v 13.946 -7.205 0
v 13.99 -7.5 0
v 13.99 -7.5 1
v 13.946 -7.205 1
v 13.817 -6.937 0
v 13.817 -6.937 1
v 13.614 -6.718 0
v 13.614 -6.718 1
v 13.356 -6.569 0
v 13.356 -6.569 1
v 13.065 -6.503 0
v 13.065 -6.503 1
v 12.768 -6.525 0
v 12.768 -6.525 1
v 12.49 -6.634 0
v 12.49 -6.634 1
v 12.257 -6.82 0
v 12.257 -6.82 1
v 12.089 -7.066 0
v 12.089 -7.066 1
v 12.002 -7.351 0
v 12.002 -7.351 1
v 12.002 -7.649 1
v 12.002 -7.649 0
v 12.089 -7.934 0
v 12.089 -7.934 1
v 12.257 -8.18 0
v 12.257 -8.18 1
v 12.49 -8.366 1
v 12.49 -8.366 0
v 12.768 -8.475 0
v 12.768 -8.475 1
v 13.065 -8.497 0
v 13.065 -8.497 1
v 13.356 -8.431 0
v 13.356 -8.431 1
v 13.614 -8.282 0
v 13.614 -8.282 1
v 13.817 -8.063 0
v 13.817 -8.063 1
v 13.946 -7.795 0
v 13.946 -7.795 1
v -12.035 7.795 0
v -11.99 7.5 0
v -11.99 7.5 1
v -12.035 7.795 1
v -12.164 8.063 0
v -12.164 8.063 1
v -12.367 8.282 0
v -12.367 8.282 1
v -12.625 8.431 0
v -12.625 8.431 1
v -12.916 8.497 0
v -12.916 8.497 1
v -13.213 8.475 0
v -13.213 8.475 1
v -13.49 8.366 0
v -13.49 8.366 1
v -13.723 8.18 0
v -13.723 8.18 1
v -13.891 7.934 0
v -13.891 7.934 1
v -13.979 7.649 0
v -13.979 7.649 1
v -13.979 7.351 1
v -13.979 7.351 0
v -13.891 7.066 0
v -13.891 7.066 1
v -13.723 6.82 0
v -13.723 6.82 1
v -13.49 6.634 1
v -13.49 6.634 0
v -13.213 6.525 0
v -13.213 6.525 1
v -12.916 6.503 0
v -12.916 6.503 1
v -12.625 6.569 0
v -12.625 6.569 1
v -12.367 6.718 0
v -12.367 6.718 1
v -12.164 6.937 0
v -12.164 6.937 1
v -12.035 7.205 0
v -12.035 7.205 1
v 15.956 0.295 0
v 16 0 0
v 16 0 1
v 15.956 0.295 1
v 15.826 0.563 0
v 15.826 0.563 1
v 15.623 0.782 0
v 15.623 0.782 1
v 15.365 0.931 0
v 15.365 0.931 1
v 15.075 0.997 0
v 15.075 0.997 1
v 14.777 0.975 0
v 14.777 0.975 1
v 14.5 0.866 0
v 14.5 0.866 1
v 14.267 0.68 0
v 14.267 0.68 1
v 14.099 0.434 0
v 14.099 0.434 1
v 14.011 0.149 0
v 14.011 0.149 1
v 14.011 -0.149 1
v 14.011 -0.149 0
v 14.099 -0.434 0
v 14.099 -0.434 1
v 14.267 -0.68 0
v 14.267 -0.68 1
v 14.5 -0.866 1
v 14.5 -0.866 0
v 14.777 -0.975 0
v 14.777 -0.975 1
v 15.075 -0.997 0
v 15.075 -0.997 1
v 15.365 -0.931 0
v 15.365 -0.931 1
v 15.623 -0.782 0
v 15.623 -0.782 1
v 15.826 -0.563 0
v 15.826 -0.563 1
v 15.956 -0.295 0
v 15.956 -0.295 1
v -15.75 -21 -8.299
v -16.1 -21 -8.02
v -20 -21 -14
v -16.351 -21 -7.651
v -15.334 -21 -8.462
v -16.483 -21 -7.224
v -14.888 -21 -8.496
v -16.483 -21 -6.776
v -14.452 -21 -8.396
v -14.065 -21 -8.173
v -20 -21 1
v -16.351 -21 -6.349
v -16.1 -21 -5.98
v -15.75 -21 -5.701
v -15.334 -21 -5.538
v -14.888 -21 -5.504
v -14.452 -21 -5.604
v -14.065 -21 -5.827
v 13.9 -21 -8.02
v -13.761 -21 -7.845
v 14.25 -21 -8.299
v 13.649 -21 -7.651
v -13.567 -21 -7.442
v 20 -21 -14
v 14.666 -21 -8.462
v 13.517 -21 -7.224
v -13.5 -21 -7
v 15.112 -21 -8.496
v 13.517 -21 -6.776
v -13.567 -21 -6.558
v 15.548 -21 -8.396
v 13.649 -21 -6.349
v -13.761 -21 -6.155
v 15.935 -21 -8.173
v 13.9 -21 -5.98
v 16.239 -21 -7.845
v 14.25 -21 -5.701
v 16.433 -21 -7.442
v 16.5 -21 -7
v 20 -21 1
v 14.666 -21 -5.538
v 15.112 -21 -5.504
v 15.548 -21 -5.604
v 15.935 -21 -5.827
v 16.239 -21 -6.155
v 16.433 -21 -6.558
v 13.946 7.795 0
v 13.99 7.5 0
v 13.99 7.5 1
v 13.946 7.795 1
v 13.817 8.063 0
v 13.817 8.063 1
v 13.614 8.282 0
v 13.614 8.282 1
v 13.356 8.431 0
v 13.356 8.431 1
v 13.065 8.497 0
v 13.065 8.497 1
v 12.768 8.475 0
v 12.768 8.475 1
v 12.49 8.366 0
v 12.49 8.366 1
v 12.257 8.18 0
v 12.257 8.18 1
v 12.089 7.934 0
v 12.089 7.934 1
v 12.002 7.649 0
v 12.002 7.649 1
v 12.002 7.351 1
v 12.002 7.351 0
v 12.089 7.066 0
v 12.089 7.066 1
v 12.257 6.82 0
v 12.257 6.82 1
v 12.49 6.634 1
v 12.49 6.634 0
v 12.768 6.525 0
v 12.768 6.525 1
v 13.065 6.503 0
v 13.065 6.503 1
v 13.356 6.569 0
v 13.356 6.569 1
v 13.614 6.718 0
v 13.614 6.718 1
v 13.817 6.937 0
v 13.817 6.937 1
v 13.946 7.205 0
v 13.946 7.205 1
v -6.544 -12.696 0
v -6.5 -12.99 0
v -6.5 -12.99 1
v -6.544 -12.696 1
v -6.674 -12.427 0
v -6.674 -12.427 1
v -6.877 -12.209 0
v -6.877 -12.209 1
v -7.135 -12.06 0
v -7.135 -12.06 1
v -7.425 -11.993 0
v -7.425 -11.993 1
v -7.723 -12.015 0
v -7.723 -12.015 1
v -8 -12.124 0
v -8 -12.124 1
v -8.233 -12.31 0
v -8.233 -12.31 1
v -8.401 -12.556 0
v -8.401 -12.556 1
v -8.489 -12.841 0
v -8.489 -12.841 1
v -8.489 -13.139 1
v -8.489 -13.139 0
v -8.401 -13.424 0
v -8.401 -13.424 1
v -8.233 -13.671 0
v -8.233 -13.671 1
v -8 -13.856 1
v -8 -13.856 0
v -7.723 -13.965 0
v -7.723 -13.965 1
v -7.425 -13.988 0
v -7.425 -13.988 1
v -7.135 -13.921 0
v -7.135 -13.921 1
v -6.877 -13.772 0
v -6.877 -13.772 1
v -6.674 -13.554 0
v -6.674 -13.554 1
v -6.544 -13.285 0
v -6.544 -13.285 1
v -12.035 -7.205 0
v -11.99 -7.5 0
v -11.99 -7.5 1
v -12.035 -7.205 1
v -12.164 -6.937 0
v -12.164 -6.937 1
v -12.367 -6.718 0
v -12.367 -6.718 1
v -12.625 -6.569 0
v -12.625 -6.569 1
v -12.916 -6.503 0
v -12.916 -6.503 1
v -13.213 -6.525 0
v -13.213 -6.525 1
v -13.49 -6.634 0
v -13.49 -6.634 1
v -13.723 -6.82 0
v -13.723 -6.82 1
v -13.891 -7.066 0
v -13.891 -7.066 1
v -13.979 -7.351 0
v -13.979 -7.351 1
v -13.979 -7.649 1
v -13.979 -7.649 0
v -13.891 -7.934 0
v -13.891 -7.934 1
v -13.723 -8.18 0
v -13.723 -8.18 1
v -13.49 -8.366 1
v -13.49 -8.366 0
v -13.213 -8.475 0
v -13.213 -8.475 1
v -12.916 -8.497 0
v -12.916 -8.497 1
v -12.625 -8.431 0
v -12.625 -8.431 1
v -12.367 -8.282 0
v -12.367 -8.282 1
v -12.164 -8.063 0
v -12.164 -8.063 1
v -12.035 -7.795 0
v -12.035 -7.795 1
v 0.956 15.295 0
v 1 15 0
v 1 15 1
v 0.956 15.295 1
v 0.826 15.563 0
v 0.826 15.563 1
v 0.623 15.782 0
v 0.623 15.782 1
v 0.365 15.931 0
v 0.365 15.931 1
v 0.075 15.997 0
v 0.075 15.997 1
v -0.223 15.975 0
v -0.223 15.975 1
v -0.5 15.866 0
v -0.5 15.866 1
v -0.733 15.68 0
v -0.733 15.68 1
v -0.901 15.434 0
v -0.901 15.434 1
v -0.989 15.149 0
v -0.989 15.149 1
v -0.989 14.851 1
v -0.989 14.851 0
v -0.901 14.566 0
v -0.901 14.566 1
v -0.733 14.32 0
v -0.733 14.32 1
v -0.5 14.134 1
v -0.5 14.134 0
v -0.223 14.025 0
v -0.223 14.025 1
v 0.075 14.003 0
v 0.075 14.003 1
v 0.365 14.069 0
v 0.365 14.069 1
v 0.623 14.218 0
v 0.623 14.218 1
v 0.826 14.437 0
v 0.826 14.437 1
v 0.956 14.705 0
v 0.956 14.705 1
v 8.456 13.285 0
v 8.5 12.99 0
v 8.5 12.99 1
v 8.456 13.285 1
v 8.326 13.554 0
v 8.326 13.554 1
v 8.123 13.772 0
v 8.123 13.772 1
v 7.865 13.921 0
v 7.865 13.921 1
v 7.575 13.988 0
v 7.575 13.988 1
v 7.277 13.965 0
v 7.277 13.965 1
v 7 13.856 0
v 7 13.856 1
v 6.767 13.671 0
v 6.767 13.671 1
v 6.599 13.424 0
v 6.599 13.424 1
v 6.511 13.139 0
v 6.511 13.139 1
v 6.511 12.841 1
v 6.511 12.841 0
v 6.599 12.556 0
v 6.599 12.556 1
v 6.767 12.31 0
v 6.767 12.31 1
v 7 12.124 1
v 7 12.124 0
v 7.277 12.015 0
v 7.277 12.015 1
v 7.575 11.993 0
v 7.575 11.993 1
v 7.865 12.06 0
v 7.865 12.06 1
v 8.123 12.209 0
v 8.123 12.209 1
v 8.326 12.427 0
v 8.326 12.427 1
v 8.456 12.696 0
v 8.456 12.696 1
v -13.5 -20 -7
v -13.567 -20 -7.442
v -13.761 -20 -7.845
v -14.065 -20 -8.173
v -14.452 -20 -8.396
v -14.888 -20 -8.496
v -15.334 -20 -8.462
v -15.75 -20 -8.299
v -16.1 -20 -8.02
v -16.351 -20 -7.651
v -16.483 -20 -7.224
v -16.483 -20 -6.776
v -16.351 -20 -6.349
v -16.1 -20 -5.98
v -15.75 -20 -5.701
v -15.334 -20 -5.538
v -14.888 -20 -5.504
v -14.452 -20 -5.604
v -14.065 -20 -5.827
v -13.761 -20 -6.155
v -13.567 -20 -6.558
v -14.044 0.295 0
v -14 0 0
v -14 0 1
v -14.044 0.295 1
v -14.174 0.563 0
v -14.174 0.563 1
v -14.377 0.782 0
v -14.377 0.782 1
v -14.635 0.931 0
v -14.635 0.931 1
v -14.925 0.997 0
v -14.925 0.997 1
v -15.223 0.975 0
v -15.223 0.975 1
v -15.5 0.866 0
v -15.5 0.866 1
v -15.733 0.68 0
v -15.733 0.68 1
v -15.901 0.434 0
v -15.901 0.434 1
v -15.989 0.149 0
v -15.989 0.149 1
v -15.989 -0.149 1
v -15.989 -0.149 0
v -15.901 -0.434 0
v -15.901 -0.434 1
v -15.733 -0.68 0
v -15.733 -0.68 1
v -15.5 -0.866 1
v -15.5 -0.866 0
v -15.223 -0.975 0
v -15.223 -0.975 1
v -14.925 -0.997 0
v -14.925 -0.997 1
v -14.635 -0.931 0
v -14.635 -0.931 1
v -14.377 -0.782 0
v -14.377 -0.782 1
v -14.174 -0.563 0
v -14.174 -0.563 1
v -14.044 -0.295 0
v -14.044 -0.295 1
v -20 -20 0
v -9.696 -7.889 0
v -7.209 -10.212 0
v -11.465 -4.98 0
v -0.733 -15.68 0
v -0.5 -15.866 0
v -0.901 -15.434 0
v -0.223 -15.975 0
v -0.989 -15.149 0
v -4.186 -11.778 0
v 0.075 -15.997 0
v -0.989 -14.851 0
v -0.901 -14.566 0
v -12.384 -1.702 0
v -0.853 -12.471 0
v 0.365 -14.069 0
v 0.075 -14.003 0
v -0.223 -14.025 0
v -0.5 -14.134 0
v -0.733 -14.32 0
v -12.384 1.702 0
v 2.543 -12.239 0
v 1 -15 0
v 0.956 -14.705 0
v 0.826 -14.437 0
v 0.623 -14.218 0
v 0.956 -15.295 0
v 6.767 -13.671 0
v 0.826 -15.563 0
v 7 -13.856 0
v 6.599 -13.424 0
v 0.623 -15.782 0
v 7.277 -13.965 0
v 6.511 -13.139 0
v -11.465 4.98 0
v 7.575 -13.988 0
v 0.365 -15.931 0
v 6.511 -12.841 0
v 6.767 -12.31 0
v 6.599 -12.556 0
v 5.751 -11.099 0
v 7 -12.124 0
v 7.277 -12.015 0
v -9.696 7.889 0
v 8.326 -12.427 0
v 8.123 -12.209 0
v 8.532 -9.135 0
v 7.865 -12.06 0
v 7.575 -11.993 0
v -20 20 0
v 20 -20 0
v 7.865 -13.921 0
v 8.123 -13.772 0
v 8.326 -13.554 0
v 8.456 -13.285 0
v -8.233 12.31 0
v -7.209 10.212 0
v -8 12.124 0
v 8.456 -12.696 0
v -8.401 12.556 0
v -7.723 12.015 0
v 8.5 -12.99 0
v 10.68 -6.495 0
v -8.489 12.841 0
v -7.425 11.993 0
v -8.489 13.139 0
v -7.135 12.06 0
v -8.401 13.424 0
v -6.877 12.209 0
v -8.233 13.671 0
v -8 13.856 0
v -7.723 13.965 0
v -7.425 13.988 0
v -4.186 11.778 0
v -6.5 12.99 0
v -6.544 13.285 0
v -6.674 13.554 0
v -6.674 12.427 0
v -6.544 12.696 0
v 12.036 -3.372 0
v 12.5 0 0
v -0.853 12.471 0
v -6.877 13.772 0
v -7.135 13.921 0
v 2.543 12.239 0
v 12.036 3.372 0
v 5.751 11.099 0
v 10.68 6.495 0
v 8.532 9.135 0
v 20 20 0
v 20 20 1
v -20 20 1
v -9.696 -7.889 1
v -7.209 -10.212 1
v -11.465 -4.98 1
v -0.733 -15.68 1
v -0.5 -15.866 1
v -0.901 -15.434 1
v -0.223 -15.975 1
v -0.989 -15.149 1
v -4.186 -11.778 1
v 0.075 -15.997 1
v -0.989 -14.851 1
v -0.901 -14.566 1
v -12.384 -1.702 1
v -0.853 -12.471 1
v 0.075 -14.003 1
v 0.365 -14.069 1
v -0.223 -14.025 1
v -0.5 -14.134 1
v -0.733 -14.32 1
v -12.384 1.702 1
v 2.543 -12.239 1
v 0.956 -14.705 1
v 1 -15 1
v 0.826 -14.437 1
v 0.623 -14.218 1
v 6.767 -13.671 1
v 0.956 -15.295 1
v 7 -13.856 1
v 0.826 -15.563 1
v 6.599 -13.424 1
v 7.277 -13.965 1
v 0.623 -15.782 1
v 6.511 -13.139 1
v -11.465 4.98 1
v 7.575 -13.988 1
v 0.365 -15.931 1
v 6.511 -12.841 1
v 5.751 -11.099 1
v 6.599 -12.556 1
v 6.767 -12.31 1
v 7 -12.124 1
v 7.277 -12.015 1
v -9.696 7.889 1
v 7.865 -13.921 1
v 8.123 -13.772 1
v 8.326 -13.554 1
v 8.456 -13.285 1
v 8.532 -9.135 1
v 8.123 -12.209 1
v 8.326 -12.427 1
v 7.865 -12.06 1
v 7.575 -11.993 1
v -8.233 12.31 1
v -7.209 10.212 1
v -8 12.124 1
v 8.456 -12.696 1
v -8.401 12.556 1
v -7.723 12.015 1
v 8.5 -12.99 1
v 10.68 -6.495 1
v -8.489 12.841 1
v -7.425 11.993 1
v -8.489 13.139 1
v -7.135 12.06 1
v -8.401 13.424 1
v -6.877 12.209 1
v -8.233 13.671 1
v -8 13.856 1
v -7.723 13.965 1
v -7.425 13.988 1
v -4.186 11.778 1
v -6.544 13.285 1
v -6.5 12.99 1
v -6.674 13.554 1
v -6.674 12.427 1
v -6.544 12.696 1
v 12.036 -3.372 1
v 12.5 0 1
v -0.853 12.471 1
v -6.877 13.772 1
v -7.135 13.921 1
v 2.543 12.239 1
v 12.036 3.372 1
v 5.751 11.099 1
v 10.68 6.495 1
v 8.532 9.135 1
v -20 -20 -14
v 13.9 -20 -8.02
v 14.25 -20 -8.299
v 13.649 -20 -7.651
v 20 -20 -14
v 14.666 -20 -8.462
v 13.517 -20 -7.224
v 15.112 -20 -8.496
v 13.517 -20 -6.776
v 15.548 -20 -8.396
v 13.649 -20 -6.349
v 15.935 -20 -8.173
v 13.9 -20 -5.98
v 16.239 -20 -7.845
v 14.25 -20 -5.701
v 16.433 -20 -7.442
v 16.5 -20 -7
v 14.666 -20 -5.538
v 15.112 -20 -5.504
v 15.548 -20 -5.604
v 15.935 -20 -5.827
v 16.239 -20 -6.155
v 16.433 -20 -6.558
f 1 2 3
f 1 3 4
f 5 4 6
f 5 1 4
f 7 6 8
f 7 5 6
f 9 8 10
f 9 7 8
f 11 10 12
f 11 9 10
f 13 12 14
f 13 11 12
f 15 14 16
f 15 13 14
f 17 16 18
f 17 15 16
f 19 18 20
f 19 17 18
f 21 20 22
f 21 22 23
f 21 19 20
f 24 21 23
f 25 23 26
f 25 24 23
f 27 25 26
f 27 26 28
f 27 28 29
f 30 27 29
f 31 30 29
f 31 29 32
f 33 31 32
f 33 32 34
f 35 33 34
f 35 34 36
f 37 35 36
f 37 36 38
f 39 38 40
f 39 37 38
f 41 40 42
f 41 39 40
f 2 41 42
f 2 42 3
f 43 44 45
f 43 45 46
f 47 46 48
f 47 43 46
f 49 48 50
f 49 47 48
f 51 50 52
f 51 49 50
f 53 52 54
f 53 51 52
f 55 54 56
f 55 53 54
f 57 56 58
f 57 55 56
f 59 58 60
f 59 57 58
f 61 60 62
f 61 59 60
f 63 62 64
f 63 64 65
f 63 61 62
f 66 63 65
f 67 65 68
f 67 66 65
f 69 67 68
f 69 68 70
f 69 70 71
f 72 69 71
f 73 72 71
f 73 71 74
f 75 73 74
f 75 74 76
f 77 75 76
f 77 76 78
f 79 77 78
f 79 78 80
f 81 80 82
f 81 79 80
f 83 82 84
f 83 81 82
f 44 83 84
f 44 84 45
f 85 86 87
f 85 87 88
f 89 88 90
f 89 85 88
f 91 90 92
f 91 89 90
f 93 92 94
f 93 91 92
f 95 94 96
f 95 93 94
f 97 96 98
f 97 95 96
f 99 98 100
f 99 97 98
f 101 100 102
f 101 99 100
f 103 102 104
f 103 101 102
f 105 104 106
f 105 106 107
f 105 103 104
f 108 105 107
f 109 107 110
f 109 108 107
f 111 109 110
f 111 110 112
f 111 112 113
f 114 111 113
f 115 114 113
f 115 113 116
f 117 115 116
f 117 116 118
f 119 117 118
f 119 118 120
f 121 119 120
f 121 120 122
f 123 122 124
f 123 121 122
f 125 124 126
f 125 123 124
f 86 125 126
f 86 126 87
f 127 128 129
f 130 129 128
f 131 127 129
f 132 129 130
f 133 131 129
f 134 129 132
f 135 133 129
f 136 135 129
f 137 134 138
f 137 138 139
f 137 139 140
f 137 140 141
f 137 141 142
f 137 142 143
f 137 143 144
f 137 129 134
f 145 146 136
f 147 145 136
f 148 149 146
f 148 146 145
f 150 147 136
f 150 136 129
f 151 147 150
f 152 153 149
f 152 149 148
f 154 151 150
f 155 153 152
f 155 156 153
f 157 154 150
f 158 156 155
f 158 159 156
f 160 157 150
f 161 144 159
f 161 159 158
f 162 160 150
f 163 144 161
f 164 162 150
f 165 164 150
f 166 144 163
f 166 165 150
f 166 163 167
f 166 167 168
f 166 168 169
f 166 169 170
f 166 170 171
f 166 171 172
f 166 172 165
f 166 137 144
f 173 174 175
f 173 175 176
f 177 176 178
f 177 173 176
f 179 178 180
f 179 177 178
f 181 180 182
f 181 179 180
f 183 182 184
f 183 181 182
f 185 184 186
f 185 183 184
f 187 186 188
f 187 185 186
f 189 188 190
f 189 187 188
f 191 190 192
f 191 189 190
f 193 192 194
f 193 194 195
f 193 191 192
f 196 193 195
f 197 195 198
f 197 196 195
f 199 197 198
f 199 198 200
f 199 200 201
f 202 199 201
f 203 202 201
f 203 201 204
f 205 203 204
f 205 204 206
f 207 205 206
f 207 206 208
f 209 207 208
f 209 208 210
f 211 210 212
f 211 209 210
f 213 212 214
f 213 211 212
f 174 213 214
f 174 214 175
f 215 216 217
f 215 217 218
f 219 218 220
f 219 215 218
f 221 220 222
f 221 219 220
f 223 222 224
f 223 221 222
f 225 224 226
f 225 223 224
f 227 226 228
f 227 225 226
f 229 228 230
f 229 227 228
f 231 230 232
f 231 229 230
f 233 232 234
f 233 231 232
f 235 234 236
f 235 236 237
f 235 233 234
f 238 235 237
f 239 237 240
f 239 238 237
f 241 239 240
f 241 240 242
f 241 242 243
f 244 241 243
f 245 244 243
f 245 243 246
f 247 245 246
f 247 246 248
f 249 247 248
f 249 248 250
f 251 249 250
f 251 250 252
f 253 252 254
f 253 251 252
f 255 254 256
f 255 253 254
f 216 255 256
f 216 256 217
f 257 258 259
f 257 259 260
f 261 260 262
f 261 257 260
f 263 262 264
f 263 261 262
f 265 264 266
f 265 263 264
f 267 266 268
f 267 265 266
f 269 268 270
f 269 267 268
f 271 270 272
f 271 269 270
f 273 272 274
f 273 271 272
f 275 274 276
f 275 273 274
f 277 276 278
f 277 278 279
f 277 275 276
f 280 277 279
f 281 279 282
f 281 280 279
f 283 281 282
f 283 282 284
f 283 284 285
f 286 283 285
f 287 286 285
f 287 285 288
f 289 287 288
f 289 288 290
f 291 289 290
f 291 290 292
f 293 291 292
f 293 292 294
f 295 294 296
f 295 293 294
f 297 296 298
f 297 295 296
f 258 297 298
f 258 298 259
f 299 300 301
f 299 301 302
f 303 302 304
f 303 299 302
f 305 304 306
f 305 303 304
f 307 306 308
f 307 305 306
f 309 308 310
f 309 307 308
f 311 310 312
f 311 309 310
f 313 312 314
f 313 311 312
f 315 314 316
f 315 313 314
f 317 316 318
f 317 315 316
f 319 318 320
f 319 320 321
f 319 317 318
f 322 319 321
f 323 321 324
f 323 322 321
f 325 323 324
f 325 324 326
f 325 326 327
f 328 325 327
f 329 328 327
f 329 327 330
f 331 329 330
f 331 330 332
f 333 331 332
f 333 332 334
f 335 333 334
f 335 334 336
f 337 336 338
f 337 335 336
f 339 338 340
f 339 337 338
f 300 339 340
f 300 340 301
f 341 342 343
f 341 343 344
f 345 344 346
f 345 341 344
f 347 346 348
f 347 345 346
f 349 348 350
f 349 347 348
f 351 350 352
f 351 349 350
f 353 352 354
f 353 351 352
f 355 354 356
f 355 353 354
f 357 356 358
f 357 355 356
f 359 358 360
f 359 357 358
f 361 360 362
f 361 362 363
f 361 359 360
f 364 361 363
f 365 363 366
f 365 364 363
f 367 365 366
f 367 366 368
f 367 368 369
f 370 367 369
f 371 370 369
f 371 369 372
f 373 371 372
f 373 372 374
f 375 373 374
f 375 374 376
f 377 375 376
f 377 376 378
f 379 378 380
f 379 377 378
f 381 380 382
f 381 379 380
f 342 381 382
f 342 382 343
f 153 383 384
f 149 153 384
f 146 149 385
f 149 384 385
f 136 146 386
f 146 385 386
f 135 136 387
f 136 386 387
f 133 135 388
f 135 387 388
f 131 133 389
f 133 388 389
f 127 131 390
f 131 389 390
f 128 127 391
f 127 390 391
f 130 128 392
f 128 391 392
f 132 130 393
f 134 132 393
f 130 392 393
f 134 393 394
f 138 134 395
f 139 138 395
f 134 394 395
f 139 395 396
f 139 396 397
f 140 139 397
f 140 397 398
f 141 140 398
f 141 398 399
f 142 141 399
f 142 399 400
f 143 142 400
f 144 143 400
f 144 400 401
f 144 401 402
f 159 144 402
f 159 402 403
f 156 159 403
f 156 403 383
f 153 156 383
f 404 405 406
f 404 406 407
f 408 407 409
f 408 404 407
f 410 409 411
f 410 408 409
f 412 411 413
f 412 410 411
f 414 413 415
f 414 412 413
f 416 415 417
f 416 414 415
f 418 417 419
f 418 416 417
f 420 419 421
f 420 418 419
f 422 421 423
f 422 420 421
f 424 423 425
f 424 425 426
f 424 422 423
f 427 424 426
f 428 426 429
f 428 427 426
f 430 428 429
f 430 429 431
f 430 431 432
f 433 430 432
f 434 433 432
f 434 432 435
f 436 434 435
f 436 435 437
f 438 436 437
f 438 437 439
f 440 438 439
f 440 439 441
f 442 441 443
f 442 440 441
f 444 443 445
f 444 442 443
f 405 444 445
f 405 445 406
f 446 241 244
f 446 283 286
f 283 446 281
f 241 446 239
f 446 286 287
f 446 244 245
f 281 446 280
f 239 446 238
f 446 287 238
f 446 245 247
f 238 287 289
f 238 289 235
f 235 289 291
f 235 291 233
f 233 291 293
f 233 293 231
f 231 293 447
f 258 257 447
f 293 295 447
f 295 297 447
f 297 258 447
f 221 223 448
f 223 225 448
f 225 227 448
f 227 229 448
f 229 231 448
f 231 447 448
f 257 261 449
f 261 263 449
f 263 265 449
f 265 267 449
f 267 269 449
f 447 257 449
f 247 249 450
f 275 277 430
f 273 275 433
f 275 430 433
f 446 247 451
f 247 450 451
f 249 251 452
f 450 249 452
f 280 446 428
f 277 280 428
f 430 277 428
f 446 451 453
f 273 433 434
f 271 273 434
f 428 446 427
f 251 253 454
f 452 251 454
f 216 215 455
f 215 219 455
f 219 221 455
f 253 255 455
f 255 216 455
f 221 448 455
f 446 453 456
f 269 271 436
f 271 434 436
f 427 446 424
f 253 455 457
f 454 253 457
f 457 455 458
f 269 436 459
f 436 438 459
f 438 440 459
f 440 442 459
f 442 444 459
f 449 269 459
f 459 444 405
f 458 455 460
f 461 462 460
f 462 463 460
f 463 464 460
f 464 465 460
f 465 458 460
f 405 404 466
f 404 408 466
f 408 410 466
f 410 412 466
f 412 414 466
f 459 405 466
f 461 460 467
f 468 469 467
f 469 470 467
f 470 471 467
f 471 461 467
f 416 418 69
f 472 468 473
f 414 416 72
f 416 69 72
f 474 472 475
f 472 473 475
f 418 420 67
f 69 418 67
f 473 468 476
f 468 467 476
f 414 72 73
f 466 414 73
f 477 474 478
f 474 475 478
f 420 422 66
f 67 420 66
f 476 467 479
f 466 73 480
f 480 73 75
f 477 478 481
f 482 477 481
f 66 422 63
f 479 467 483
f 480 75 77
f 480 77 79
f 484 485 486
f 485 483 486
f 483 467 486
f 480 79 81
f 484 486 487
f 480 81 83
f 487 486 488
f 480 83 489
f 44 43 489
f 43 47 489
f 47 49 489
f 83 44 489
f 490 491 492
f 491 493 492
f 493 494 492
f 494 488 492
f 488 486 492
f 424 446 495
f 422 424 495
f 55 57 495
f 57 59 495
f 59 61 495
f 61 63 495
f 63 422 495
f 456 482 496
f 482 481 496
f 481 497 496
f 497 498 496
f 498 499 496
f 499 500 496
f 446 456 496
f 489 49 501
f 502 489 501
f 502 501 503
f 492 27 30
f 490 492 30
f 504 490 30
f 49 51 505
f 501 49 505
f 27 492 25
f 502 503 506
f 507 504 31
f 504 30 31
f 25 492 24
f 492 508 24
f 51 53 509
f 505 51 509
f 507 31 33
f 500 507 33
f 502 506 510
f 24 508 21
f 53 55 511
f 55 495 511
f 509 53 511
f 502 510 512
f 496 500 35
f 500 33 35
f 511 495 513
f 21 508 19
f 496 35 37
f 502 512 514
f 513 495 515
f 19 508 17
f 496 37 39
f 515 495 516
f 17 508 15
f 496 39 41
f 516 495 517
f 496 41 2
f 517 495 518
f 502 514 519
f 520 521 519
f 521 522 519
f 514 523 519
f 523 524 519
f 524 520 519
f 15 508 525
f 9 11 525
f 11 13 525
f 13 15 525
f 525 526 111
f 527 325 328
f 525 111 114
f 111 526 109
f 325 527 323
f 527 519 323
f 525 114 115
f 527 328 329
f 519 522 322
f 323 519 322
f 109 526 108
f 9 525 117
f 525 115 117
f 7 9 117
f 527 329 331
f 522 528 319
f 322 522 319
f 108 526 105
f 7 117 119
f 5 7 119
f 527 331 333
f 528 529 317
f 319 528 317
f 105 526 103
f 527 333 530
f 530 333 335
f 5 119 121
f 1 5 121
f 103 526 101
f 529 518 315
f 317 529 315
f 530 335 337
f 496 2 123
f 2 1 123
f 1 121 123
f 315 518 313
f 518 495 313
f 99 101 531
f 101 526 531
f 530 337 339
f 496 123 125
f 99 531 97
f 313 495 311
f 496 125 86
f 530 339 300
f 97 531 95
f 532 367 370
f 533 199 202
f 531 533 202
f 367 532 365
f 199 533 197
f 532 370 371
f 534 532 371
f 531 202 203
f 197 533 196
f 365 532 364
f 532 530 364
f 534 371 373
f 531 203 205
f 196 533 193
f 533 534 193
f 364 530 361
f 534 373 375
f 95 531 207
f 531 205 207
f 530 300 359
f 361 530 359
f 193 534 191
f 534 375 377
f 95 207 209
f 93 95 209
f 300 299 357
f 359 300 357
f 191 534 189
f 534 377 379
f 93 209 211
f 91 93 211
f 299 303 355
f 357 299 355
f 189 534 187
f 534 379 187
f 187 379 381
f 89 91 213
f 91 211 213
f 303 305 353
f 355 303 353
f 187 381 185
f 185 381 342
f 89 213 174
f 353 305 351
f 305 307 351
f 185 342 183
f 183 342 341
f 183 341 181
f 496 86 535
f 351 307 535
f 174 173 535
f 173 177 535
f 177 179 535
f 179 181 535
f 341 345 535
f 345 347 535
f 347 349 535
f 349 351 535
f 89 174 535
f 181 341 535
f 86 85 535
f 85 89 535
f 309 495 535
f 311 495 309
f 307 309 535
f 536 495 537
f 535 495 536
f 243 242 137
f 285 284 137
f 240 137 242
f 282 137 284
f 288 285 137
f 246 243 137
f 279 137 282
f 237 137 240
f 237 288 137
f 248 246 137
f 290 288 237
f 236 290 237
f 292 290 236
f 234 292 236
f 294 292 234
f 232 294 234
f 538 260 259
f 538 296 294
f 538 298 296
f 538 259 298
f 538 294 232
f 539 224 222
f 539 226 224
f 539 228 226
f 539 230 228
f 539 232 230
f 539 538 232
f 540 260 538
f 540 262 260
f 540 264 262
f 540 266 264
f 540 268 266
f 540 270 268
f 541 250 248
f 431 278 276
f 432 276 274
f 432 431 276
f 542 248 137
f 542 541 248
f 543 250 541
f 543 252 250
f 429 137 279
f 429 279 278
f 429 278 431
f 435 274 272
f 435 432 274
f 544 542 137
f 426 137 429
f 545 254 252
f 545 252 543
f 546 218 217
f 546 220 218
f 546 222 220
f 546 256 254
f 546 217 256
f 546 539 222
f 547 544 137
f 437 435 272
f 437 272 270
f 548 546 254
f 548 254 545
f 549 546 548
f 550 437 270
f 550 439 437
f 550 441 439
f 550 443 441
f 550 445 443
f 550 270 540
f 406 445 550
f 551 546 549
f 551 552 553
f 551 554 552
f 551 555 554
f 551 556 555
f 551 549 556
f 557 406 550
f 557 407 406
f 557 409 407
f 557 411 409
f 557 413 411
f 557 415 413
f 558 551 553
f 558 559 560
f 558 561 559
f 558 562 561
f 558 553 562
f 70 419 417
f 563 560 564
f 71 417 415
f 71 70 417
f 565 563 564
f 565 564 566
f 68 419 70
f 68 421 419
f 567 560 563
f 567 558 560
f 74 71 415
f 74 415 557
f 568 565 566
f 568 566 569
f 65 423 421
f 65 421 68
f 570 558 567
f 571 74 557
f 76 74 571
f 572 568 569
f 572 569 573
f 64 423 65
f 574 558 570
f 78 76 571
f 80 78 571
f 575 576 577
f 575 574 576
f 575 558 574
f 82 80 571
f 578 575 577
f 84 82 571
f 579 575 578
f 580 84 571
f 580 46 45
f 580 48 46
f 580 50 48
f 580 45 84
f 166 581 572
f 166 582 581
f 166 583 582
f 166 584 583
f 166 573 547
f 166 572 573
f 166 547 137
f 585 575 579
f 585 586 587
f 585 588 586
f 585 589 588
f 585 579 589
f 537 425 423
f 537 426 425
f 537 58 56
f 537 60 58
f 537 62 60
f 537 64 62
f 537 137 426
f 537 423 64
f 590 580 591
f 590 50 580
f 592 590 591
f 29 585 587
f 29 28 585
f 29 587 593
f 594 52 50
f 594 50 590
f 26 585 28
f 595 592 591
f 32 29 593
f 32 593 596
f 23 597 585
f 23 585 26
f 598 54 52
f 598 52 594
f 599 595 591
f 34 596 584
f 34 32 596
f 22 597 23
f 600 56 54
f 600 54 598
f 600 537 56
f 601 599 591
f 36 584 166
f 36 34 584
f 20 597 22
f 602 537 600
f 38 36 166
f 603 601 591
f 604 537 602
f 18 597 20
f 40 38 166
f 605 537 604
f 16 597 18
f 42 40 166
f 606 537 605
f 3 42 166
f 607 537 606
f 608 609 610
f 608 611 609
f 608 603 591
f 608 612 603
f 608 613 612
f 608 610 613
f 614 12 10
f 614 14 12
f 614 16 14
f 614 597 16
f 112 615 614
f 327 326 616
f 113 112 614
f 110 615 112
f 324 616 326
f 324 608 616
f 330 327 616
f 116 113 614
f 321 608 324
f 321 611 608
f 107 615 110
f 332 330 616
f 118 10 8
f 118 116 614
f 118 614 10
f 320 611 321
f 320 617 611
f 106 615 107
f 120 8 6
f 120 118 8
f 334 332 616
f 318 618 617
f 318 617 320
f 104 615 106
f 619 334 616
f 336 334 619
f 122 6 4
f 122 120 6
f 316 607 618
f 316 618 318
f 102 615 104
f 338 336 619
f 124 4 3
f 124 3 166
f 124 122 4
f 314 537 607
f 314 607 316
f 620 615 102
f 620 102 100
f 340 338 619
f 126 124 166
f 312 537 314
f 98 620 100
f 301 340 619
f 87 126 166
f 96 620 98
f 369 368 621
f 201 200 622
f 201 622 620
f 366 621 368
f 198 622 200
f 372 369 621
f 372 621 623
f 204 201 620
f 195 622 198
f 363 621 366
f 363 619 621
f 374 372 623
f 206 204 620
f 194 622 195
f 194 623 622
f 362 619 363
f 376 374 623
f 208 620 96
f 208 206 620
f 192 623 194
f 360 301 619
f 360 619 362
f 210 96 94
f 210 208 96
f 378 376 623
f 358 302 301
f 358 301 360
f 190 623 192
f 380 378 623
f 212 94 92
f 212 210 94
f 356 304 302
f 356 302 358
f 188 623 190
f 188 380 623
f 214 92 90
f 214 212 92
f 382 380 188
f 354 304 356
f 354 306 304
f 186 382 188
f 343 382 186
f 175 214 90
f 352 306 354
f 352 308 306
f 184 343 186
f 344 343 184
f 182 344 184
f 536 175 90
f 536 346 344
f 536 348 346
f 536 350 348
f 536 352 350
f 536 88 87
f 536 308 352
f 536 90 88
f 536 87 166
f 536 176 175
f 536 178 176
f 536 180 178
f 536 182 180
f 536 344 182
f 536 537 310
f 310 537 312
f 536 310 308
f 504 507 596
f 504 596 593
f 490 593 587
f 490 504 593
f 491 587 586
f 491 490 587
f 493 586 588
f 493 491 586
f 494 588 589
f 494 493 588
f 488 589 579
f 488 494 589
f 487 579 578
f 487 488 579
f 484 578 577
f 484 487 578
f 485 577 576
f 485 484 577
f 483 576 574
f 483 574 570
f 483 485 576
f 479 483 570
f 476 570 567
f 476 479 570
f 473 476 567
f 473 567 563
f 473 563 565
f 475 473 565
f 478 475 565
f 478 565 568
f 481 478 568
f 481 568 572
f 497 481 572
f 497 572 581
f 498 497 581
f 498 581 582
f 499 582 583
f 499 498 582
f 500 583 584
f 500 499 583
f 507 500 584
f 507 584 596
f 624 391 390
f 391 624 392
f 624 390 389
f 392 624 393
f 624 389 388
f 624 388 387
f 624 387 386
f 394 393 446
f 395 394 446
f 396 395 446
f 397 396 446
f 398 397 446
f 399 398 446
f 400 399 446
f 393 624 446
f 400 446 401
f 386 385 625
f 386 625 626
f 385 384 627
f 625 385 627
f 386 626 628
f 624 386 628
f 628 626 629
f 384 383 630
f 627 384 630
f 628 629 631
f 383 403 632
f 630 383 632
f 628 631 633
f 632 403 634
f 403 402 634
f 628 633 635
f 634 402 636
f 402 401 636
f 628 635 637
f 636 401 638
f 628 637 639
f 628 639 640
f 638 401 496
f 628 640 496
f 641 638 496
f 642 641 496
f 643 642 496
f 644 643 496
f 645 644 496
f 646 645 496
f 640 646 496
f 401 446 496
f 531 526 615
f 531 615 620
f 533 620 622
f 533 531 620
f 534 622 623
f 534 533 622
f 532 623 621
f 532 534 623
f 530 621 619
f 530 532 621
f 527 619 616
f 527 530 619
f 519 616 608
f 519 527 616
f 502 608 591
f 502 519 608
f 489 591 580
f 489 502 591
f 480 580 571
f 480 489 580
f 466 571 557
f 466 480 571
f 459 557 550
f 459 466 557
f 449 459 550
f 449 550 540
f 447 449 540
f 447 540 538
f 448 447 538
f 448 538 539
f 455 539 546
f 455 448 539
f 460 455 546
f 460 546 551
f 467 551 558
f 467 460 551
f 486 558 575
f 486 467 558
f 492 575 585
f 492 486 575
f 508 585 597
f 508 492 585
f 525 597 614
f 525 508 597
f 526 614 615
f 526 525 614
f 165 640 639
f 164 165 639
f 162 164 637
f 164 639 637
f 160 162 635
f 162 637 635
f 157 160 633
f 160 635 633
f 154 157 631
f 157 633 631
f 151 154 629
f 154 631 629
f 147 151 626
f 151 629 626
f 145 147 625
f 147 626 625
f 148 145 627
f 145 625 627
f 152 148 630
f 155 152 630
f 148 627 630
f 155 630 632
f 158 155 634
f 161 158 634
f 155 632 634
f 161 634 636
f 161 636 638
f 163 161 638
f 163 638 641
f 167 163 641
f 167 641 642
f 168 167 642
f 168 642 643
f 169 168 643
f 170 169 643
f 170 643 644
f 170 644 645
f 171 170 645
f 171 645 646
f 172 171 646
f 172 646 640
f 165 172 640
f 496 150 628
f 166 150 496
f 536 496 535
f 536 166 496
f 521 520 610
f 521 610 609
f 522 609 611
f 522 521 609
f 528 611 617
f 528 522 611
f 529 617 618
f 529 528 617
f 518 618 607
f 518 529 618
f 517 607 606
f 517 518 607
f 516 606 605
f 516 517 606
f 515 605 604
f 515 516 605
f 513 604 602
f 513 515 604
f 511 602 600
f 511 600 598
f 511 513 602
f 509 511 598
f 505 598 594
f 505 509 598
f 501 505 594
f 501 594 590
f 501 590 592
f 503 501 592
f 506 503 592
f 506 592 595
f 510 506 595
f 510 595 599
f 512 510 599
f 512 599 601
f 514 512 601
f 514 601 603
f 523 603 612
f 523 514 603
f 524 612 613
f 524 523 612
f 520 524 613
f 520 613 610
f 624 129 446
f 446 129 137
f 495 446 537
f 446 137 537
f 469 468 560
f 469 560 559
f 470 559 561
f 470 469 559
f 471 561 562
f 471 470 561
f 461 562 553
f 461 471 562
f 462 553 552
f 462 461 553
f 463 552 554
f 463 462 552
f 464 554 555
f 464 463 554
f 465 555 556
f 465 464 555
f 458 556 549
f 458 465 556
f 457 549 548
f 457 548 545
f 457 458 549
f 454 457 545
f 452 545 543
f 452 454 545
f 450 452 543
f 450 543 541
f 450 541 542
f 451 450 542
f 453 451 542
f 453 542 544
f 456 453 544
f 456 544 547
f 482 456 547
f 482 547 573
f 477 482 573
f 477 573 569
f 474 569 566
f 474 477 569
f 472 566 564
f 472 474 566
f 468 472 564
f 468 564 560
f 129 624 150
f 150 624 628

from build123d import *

# Parameters (mm, degrees)
SKETCH1_W           = 40
SKETCH1_H           = 40
SKETCH1_R           = 12.5
SKETCH1_R_2         = 1
BOSS_EXTRUDE2_DEPTH = 1
SKETCH2_W           = 40
SKETCH2_H           = 1
BOSS_EXTRUDE3_DEPTH = 15
SKETCH3_R           = 1.5
CUT_EXTRUDE1_DEPTH  = 2


with BuildPart() as part:
    # Sketch1 → Boss-Extrude2 (new body)
    with BuildSketch(Plane.XY):
        Rectangle(SKETCH1_W, SKETCH1_H)
        Circle(SKETCH1_R, mode=Mode.SUBTRACT)
        with Locations((0, 15)):
            Circle(SKETCH1_R_2, mode=Mode.SUBTRACT)
        with Locations((7.5, 12.990381057)):
            Circle(SKETCH1_R_2, mode=Mode.SUBTRACT)
        with Locations((12.990381057, 7.5)):
            Circle(SKETCH1_R_2, mode=Mode.SUBTRACT)
        with Locations((15, 0)):
            Circle(SKETCH1_R_2, mode=Mode.SUBTRACT)
        with Locations((12.990381057, -7.5)):
            Circle(SKETCH1_R_2, mode=Mode.SUBTRACT)
        with Locations((7.5, -12.990381057)):
            Circle(SKETCH1_R_2, mode=Mode.SUBTRACT)
        with Locations((0, -15)):
            Circle(SKETCH1_R_2, mode=Mode.SUBTRACT)
        with Locations((-7.5, -12.990381057)):
            Circle(SKETCH1_R_2, mode=Mode.SUBTRACT)
        with Locations((-12.990381057, -7.5)):
            Circle(SKETCH1_R_2, mode=Mode.SUBTRACT)
        with Locations((-15, 0)):
            Circle(SKETCH1_R_2, mode=Mode.SUBTRACT)
        with Locations((-12.990381057, 7.5)):
            Circle(SKETCH1_R_2, mode=Mode.SUBTRACT)
        with Locations((-7.5, 12.990381057)):
            Circle(SKETCH1_R_2, mode=Mode.SUBTRACT)
    extrude(amount=BOSS_EXTRUDE2_DEPTH)

    # Sketch2 → Boss-Extrude3 (add)
    with BuildSketch(Plane.XY.offset(1)):
        with Locations((0, -20.5)):
            Rectangle(SKETCH2_W, SKETCH2_H)
    extrude(amount=-BOSS_EXTRUDE3_DEPTH)

    # Sketch3 → Cut-Extrude1 (cut, through all)
    with BuildSketch(Plane(origin=(0, -20, 0), x_dir=(1, 0, 0), z_dir=(0, 1, 0))):
        with Locations((-15, 7)):
            Circle(SKETCH3_R)
        with Locations((15, 7)):
            Circle(SKETCH3_R)
    extrude(amount=-CUT_EXTRUDE1_DEPTH, mode=Mode.SUBTRACT)


solid = part.part
